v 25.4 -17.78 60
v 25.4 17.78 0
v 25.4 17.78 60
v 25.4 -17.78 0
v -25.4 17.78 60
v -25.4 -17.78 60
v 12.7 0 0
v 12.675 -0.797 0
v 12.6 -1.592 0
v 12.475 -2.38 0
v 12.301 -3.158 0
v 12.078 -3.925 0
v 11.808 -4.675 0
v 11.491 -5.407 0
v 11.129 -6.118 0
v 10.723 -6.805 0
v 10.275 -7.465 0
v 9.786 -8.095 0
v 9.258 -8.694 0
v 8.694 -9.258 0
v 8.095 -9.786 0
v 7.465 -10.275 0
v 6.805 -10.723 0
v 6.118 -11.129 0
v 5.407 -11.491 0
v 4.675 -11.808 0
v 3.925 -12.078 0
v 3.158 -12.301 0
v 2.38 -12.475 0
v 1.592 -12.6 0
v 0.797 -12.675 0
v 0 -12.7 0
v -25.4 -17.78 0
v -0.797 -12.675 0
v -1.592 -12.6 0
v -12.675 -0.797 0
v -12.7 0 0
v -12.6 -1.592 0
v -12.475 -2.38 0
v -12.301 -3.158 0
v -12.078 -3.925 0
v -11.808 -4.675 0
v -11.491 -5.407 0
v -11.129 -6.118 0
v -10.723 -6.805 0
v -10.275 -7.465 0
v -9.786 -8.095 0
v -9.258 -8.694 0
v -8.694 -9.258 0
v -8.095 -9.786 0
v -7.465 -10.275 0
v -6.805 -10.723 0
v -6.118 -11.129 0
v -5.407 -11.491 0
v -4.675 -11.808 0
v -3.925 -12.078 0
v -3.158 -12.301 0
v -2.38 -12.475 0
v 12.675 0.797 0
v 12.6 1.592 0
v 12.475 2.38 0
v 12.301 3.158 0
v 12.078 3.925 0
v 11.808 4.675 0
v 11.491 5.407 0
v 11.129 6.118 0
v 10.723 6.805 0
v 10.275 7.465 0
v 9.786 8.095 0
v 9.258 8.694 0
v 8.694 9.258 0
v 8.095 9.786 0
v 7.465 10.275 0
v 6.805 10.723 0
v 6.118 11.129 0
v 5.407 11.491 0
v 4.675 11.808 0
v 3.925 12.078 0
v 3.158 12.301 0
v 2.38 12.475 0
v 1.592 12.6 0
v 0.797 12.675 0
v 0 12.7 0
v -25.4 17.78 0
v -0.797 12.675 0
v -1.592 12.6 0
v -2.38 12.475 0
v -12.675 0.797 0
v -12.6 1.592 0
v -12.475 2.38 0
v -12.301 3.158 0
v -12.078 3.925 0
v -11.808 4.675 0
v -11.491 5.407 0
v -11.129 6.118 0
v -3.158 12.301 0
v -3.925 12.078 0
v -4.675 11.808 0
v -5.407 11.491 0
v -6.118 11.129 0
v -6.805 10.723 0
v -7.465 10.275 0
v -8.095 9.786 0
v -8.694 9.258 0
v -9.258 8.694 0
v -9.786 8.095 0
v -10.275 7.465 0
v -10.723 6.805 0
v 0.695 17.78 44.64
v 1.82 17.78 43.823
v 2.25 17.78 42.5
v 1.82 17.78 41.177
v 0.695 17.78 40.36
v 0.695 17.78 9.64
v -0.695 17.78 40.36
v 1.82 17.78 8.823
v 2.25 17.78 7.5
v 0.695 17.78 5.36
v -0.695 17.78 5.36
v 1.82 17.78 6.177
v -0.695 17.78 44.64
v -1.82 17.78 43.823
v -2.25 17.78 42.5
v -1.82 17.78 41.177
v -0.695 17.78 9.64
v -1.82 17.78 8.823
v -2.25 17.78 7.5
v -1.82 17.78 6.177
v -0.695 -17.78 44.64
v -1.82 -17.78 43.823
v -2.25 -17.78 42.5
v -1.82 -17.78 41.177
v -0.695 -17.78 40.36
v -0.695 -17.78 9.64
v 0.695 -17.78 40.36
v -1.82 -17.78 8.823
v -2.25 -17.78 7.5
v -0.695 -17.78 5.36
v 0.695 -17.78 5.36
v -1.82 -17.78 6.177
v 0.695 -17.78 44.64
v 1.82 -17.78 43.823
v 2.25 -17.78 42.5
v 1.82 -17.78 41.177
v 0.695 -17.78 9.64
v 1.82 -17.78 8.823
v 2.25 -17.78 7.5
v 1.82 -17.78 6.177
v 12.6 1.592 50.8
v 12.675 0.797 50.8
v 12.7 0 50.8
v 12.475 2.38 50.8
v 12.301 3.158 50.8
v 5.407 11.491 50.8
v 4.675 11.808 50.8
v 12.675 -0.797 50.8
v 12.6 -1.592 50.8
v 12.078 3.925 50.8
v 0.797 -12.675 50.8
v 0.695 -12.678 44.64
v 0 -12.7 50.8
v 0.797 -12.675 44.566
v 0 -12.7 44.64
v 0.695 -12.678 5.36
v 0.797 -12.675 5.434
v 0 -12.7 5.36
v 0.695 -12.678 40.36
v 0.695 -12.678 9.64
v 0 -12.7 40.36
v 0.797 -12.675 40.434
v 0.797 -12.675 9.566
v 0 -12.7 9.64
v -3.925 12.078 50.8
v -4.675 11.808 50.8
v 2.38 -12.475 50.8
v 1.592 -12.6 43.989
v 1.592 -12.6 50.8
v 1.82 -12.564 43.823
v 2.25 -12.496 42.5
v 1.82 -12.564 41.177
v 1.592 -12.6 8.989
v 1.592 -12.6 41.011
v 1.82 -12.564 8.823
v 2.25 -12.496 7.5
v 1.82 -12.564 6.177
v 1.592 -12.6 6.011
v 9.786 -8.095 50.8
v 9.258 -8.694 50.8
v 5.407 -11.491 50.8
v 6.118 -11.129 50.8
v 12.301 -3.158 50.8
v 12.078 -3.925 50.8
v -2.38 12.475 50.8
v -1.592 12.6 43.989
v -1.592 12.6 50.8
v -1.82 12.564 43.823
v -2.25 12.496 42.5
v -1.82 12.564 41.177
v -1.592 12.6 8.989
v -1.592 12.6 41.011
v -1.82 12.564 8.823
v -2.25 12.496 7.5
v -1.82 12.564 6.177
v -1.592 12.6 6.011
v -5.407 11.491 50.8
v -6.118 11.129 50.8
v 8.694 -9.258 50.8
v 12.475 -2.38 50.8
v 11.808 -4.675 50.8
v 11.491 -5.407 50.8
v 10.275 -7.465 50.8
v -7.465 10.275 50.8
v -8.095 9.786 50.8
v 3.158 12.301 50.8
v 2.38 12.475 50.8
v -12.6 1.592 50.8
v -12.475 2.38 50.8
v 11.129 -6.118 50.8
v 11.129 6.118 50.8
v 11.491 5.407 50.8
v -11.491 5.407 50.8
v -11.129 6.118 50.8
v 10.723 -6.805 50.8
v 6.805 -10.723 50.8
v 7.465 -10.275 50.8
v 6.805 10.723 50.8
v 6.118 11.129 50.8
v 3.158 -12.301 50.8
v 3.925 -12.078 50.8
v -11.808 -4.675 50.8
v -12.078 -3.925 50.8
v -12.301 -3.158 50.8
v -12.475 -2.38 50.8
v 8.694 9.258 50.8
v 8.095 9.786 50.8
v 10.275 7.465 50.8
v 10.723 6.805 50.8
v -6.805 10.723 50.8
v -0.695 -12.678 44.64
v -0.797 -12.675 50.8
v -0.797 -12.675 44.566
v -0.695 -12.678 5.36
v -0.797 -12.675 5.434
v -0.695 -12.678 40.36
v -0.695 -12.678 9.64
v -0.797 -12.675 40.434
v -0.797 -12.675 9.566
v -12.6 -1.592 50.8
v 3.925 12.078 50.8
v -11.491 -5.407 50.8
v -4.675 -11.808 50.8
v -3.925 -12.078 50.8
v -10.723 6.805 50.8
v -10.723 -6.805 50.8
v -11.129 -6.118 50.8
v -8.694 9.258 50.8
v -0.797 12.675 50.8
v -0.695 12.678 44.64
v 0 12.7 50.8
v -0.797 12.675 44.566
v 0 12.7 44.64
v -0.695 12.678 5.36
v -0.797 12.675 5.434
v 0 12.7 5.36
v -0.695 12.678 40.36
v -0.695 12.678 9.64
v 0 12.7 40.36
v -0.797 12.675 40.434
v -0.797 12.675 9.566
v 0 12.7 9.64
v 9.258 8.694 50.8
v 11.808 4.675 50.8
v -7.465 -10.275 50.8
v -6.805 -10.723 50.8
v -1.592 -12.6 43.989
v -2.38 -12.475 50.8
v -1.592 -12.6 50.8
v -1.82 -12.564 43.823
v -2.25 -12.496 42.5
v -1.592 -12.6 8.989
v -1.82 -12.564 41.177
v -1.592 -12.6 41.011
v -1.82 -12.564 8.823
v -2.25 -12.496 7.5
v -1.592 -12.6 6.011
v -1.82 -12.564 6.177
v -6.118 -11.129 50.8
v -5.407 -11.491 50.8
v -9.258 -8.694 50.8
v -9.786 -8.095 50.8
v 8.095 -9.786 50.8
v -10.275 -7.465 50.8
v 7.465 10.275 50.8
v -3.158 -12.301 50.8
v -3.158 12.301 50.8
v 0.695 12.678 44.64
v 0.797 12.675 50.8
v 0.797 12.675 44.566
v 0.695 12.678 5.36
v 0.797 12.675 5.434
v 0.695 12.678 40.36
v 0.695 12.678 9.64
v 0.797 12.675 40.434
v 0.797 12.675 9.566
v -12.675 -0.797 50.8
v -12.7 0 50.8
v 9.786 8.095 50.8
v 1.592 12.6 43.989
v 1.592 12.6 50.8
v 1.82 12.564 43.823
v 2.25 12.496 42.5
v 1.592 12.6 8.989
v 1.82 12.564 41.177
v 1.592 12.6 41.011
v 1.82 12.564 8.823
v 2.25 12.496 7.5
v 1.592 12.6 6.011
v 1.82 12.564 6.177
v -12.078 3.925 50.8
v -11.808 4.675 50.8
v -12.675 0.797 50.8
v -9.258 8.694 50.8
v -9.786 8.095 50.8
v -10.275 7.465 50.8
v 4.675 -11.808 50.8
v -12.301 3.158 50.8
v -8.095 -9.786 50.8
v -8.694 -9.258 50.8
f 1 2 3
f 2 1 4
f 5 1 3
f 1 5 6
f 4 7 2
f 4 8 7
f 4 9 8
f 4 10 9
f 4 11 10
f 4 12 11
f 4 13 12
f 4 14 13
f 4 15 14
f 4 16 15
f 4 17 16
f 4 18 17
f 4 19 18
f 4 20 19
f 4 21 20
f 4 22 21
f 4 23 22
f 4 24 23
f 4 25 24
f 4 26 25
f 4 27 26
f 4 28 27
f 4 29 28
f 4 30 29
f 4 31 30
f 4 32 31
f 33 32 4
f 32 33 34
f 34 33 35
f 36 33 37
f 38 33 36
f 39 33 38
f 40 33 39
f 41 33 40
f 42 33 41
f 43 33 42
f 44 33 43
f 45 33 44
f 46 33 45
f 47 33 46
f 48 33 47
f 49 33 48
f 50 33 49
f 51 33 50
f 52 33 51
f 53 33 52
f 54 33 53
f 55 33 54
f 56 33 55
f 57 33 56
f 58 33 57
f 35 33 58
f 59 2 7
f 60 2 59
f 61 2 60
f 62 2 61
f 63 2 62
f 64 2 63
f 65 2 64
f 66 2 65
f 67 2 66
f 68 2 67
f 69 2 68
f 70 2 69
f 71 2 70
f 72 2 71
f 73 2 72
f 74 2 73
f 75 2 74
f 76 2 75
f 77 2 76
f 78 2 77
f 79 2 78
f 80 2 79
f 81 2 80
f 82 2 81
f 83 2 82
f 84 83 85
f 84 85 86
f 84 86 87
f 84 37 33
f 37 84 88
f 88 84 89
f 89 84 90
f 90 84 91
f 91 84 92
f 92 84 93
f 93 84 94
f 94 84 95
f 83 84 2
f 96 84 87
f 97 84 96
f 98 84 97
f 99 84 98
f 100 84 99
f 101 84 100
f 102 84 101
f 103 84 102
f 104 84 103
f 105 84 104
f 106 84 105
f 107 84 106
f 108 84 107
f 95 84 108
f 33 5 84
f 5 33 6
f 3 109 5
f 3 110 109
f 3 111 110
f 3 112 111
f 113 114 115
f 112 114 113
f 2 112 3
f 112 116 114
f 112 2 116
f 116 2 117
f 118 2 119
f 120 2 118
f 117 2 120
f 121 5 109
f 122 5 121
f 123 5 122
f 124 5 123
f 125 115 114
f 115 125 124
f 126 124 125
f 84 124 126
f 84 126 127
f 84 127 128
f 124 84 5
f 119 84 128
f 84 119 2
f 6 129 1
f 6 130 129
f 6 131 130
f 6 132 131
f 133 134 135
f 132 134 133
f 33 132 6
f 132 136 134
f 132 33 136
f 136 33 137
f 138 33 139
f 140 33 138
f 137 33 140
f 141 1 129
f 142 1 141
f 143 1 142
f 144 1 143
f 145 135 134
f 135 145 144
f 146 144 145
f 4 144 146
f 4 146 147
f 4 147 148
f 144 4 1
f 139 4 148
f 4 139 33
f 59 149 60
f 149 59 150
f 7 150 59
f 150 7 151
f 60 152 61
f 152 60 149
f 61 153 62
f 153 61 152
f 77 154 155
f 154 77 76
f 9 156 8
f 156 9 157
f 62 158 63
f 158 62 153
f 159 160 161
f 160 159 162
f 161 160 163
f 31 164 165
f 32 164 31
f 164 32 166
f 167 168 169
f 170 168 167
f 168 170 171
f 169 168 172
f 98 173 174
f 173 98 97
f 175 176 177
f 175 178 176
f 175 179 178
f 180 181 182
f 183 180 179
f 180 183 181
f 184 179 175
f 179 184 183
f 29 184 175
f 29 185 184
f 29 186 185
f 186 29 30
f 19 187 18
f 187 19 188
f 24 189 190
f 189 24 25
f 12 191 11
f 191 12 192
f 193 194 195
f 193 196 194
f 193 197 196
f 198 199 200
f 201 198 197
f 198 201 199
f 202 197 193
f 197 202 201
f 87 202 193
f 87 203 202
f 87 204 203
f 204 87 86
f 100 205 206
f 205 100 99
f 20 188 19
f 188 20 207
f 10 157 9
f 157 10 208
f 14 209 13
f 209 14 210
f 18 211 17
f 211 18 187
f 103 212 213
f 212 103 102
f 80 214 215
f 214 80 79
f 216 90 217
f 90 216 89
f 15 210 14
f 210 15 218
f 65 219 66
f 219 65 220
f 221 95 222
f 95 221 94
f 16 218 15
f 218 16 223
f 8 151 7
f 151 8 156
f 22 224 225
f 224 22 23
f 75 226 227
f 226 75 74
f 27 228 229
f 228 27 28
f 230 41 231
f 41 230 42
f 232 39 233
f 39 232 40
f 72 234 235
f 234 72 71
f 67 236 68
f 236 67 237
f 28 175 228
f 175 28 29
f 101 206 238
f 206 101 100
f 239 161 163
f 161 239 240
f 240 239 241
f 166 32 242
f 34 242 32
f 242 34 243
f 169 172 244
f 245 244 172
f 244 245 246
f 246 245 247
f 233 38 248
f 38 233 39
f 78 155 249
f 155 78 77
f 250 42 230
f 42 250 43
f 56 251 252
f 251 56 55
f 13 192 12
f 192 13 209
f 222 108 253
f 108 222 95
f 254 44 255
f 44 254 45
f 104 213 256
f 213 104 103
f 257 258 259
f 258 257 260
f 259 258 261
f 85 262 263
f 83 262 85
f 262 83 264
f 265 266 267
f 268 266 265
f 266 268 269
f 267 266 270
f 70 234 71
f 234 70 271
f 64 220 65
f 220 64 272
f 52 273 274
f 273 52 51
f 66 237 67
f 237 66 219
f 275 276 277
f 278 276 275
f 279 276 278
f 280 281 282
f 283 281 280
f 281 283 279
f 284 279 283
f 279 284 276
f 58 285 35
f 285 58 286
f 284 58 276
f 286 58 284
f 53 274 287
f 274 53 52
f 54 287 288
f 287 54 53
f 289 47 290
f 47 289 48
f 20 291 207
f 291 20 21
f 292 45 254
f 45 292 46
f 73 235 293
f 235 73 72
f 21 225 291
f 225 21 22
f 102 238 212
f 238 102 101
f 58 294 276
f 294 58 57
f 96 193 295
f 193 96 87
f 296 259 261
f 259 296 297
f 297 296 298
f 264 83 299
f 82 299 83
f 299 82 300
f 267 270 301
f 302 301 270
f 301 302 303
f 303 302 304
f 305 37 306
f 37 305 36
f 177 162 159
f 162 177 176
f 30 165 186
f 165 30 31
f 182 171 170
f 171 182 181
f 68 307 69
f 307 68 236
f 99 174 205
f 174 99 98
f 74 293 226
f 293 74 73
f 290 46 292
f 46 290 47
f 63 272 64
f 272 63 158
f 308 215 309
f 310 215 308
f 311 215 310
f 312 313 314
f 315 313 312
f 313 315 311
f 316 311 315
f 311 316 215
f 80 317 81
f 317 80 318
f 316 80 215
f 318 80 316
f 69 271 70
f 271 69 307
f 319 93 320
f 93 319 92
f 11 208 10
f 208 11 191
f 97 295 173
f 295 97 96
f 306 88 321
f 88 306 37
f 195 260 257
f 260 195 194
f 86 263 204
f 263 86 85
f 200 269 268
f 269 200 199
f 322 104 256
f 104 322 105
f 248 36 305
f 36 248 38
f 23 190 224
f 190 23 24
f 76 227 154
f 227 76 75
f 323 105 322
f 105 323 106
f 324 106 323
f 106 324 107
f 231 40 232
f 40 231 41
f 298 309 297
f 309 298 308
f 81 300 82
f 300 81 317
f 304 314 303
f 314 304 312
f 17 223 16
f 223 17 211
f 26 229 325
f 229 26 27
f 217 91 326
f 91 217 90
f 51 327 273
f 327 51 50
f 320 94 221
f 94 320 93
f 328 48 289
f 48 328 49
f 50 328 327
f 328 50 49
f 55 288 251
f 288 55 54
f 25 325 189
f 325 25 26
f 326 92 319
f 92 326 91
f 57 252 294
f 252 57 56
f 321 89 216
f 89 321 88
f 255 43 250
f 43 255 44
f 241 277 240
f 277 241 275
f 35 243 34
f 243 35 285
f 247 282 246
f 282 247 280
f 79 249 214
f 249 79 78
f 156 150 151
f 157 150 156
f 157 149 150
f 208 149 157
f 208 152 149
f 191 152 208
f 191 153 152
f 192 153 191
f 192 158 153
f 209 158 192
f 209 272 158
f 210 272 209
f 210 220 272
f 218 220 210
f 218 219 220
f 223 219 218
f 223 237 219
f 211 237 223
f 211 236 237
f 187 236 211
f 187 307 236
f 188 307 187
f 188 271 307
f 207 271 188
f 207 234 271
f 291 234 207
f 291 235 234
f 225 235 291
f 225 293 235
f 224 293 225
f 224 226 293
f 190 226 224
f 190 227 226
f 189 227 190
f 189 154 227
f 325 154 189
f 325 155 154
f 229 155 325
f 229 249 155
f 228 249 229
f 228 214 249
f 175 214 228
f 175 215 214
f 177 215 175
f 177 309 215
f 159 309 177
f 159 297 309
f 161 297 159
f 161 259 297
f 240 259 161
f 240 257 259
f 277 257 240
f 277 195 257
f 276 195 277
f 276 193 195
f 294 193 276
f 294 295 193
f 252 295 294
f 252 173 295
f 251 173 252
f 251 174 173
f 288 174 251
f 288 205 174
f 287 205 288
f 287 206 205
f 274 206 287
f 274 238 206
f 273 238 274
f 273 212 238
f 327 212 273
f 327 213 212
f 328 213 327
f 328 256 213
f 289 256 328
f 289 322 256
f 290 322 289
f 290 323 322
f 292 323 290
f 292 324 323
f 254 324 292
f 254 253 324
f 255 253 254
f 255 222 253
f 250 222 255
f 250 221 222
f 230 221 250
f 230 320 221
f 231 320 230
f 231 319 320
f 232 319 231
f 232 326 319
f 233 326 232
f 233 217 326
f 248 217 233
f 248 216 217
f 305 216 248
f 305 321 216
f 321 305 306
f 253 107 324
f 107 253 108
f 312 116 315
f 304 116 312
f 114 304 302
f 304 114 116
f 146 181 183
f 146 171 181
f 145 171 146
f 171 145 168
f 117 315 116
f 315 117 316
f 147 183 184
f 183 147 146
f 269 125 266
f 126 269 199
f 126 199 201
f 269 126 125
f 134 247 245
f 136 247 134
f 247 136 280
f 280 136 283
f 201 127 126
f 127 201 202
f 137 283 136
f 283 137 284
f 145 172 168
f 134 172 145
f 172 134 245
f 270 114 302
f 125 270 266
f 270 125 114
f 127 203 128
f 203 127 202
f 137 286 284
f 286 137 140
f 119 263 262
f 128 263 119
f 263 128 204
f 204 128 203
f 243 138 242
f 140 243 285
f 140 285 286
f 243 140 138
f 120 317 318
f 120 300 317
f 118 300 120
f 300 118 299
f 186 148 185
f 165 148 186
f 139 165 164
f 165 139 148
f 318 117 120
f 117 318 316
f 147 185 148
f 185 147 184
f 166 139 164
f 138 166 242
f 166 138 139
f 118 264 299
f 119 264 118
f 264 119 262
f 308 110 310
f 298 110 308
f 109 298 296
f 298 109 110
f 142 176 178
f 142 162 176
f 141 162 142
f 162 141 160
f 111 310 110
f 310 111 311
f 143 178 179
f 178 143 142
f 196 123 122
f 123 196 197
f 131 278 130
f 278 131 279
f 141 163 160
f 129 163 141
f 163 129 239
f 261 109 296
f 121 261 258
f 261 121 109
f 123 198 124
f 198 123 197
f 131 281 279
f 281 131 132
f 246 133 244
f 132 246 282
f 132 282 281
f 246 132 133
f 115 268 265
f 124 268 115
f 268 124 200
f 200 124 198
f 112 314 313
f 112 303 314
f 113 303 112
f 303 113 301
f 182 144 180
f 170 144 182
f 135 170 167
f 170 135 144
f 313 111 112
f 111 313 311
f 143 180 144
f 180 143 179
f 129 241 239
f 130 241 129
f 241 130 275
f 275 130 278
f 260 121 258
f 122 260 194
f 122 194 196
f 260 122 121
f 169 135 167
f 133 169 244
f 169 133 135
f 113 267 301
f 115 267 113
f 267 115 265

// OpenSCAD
// file: ../666_1026.scad
//improving rendering speed.
draft = true;   // sets rendering quality to draft.
$fs = draft ? 5 : 0.5;
$fa = 10;



module 666_1026(draft)
{
    width = main_tube_outer_diameter+2*thickness_between_tubes;	
    depth = main_tube_outer_diameter*2;
    height = depth;


    difference (){

        translate([-(width/2),-(depth/2),0])
            cube ([width,depth,height]);
    	
    	//tube
    	translate([0,0,- global_clearance/2])
    	   cylinder(h = height + global_clearance,r = main_tube_outer_diameter/2, $fn = draft ? 100 : 200);

    	//screw
    	translate([0,depth/2 + global_clearance/2,7.5])
    	   rotate([90,0,0])
    	       cylinder(h = depth + global_clearance, r = M4_screw_diameter/2, $fn = draft ? 10 : 20);


    	translate([0,depth/2 + global_clearance/2,42.5])
    	   rotate([90,0,0])
    	       cylinder(h = depth + global_clearance, r = M4_screw_diameter/2, $fn = draft ? 10 : 20);
    	
    	//bevelled edge

    	   translate([width/2,main_tube_outer_diameter - 1,- global_clearance/2])
    	       rotate([0,0,45])
    	           cube([main_tube_outer_diameter,main_tube_outer_diameter,height + global_clearance]);

        mirror([1,0,0])
            translate([width/2,main_tube_outer_diameter - 1,- global_clearance/2])
                rotate([0,0,45])
                    cube([main_tube_outer_diameter,main_tube_outer_diameter,height + global_clearance]);
    	
        mirror([0,1,0])
            translate([width/2,main_tube_outer_diameter - 1,- global_clearance/2])
                rotate([0,0,45])
                    cube([main_tube_outer_diameter,main_tube_outer_diameter,height + global_clearance]);

        mirror([1,0,0])
          mirror([0,1,0])
            translate([width/2,main_tube_outer_diameter - 1,- global_clearance/2])
                rotate([0,0,45])
                    cube([main_tube_outer_diameter,main_tube_outer_diameter,height + global_clearance]);

    }
}


module 666_1026_drillhelper(height = 60, height_of_cap_cylinder = 2){



    width = main_tube_outer_diameter*2; 
    depth = main_tube_outer_diameter + 4*thickness_between_tubes;
    


    difference (){

        translate([-(width/2),-(depth/2),0])
            cube ([width,depth,height]);
        
        //tube
        translate([0,0,- global_clearance])
           cylinder(h = 2*main_tube_outer_diameter + global_clearance,r = main_tube_outer_diameter/2, $fn = draft ? 100 : 200);

        //screw
        translate([0,depth/2 + global_clearance/2,7.5])
           rotate([90,0,0])
               cylinder(h = depth + global_clearance, r = M4_screw_diameter/2, $fn = draft ? 10 : 20);


        translate([0,depth/2 + global_clearance/2,42.5])
           rotate([90,0,0])
               cylinder(h = depth + global_clearance, r = M4_screw_diameter/2, $fn = draft ? 10 : 20);
        
    }



}


666_1026(draft);

include <../Parameters.scad>
// file: ../../Parameters.scad
//Main tube diameter - hole [mm]
main_tube_outer_diameter = 25.4;
main_tube_inner_diameter = 23.5;

//Tube for undercarriage - hole [mm]
tube_for_undercarriage_outer_diameter = 10.6;
tube_for_undercarriage_inner_diameter = 6;
global_clearance = 0.5;


//umístění podvozkových trubek

second_undercarriage_hole = main_tube_outer_diameter*2 + main_tube_outer_diameter/5 + main_tube_outer_diameter/2 + 170 + 160;

// Parameters of tube couplings
coupling_wall_thickness = main_tube_outer_diameter/5;  //width of coupling walls 
thickness_between_tubes = main_tube_outer_diameter/10;    // minimum distance between tubes in couplings

coupling_wall_thickness_undercarriage = tube_for_undercarriage_outer_diameter/3;
thickness_between_tubes_undercarriage = tube_for_undercarriage_outer_diameter/10;

//Screw diameter and nut for M4 [mm]
M4_screw_diameter=4.5;
Nut_height_M4 = 3.2;
Nut_diameter_M4 = 7.86;


//Screw diameter and nut for M3 [mm]
M3_screw_diameter = 3.2;
Nut_height_M3 = 2.7;	
Nut_diameter_M3 = 6.6; 


//The tube for help
Help_main_tube_outer = 25;
Help_main_tube_inner = 23; 
Help_tube_for_undercarriage_outer = 10;
Help_tube_for_undercarriage_inner = 5;


//main hull parameters

hull_drop_length = 580;
hull_wall_thickness = 0.8;
hull_y_size = 120;
hull_z_size = 150;
hull_x_size = 580;
hull_corner_radius = 4;
hull_airfoil_thickness= 35;  // thickness of drop generating airfoil in percent of lenght.
hull_scale_x = 1;
hull_scale_y = 1.5;
hull_scale_z = 1.5;

main_pilon_position = 170+68;
cover_pilon_position = 180;
height_of_vertical_tube = 275; //278mm je změřená délka trubky. 

//délka hlavní dlouhé trubky
length_of_main_tube = 920;
length_of_undercarriage_tube = 300;

ribbon_width = 5; // šířka vyztužovacích lemů. 

// šířka otvoru v přední části kapoty pro držák motoru.
width_of_engine_holder = 63;

//Top Cover Division - dělení horního krytu pro tisk
top_cover_division = [0, 50, 150, 280, 410, hull_x_size]; // upraveny seznam tak, aby deleni začinalo od nuly, což umožňí úplně automatické rozdělení.

//Bottom Cover Division - dělení dolního krytu pro tisk
bottom_cover_division = [0,100,232.5,365, 470, hull_x_size];
// zkrácená část pro payload pro testovací tisk
//bottom_cover_division = [0,200,250,365, 470, hull_x_size];

//Base Divison - dělení podložky
base_division = [0, 140, main_pilon_position - (3*main_tube_outer_diameter)/2 + 3 * main_tube_outer_diameter,second_undercarriage_hole - main_tube_outer_diameter/2 - coupling_wall_thickness + main_tube_outer_diameter+2*(main_tube_outer_diameter/5) + global_clearance, hull_x_size];

//Cover pilon division - na výšku (v ose Z)
cover_pilon_division = [0,170,height_of_vertical_tube + main_tube_outer_diameter + coupling_wall_thickness];

//pozice šroubů
	//horní kryt
top_screw_position = [0, (top_cover_division[0] + top_cover_division[1])/4, (top_cover_division[2] - top_cover_division[1])/2 + top_cover_division[1], (top_cover_division[3] - top_cover_division[2])/2 + top_cover_division[2],(top_cover_division[4] - top_cover_division[3])/8 + top_cover_division[3],(top_cover_division[5] - top_cover_division[4])/2 + top_cover_division[4] - 20];
	//spodní kryt
bottom_screw_position = [0,(bottom_cover_division[0] + bottom_cover_division[1])/15 + 5, bottom_cover_division[1]/1.1, + bottom_cover_division[3], bottom_cover_division[3] + bottom_cover_division[1]/1.5];




//šířka zámků
lock_width = 10;

//délka zámků
lock_length = 3;


//accumulator
//základní rozměry akumulátoru
width_of_accumulator = 129.4;//45+1;
depth_of_accumulator = 40.61;
height_of_accumulator = 43.65;
//Zapuštění akumulátoru
sink_of_accumulator = 5; //main_tube_outer_diameter/5 - Nut_height_M3*1.5;

//tloušťka hrany spojky
accumulator_holder_width = 18; 
accumulator_holder_thickness = 10; 

//posunutí akumálátoru na podložce
move_of_accumulator = 165;   // pozice akumulátoru (ovlivňuje těžiště)


////////////////
// Senzory
///////////////////

//opticalFlow
    width_optical_flow_senzor = 45.5;
    depth_optical_flow_senzor = 6;
    height_optical_flow_senzor = 35;
    sink_of_optical_flow_senzor = depth_optical_flow_senzor - 5; 
    M3_optical_flow_senzor_Z = 30.4;
    M3_optical_flow_senzor_X = 24;
    M3_optical_flow_senzor_Z_alone = 9.1;
    M3_optical_flow_senzor_X_alone = 16.7;

//GPS anténa
GPS_outer_length = 48.01;   //Vnější rozměr
GPS_inner_length = 37.48;   //Vnitřní rozměr
GPS_diameter = (GPS_outer_length - GPS_inner_length)/2;    //Průměr otvoru
GPS_middle_length = GPS_diameter + GPS_inner_length;      //Střední rozměr
// main file
include <../../Parameters.scad>

use <../666_1026.scad>


666_1026_drillhelper();
